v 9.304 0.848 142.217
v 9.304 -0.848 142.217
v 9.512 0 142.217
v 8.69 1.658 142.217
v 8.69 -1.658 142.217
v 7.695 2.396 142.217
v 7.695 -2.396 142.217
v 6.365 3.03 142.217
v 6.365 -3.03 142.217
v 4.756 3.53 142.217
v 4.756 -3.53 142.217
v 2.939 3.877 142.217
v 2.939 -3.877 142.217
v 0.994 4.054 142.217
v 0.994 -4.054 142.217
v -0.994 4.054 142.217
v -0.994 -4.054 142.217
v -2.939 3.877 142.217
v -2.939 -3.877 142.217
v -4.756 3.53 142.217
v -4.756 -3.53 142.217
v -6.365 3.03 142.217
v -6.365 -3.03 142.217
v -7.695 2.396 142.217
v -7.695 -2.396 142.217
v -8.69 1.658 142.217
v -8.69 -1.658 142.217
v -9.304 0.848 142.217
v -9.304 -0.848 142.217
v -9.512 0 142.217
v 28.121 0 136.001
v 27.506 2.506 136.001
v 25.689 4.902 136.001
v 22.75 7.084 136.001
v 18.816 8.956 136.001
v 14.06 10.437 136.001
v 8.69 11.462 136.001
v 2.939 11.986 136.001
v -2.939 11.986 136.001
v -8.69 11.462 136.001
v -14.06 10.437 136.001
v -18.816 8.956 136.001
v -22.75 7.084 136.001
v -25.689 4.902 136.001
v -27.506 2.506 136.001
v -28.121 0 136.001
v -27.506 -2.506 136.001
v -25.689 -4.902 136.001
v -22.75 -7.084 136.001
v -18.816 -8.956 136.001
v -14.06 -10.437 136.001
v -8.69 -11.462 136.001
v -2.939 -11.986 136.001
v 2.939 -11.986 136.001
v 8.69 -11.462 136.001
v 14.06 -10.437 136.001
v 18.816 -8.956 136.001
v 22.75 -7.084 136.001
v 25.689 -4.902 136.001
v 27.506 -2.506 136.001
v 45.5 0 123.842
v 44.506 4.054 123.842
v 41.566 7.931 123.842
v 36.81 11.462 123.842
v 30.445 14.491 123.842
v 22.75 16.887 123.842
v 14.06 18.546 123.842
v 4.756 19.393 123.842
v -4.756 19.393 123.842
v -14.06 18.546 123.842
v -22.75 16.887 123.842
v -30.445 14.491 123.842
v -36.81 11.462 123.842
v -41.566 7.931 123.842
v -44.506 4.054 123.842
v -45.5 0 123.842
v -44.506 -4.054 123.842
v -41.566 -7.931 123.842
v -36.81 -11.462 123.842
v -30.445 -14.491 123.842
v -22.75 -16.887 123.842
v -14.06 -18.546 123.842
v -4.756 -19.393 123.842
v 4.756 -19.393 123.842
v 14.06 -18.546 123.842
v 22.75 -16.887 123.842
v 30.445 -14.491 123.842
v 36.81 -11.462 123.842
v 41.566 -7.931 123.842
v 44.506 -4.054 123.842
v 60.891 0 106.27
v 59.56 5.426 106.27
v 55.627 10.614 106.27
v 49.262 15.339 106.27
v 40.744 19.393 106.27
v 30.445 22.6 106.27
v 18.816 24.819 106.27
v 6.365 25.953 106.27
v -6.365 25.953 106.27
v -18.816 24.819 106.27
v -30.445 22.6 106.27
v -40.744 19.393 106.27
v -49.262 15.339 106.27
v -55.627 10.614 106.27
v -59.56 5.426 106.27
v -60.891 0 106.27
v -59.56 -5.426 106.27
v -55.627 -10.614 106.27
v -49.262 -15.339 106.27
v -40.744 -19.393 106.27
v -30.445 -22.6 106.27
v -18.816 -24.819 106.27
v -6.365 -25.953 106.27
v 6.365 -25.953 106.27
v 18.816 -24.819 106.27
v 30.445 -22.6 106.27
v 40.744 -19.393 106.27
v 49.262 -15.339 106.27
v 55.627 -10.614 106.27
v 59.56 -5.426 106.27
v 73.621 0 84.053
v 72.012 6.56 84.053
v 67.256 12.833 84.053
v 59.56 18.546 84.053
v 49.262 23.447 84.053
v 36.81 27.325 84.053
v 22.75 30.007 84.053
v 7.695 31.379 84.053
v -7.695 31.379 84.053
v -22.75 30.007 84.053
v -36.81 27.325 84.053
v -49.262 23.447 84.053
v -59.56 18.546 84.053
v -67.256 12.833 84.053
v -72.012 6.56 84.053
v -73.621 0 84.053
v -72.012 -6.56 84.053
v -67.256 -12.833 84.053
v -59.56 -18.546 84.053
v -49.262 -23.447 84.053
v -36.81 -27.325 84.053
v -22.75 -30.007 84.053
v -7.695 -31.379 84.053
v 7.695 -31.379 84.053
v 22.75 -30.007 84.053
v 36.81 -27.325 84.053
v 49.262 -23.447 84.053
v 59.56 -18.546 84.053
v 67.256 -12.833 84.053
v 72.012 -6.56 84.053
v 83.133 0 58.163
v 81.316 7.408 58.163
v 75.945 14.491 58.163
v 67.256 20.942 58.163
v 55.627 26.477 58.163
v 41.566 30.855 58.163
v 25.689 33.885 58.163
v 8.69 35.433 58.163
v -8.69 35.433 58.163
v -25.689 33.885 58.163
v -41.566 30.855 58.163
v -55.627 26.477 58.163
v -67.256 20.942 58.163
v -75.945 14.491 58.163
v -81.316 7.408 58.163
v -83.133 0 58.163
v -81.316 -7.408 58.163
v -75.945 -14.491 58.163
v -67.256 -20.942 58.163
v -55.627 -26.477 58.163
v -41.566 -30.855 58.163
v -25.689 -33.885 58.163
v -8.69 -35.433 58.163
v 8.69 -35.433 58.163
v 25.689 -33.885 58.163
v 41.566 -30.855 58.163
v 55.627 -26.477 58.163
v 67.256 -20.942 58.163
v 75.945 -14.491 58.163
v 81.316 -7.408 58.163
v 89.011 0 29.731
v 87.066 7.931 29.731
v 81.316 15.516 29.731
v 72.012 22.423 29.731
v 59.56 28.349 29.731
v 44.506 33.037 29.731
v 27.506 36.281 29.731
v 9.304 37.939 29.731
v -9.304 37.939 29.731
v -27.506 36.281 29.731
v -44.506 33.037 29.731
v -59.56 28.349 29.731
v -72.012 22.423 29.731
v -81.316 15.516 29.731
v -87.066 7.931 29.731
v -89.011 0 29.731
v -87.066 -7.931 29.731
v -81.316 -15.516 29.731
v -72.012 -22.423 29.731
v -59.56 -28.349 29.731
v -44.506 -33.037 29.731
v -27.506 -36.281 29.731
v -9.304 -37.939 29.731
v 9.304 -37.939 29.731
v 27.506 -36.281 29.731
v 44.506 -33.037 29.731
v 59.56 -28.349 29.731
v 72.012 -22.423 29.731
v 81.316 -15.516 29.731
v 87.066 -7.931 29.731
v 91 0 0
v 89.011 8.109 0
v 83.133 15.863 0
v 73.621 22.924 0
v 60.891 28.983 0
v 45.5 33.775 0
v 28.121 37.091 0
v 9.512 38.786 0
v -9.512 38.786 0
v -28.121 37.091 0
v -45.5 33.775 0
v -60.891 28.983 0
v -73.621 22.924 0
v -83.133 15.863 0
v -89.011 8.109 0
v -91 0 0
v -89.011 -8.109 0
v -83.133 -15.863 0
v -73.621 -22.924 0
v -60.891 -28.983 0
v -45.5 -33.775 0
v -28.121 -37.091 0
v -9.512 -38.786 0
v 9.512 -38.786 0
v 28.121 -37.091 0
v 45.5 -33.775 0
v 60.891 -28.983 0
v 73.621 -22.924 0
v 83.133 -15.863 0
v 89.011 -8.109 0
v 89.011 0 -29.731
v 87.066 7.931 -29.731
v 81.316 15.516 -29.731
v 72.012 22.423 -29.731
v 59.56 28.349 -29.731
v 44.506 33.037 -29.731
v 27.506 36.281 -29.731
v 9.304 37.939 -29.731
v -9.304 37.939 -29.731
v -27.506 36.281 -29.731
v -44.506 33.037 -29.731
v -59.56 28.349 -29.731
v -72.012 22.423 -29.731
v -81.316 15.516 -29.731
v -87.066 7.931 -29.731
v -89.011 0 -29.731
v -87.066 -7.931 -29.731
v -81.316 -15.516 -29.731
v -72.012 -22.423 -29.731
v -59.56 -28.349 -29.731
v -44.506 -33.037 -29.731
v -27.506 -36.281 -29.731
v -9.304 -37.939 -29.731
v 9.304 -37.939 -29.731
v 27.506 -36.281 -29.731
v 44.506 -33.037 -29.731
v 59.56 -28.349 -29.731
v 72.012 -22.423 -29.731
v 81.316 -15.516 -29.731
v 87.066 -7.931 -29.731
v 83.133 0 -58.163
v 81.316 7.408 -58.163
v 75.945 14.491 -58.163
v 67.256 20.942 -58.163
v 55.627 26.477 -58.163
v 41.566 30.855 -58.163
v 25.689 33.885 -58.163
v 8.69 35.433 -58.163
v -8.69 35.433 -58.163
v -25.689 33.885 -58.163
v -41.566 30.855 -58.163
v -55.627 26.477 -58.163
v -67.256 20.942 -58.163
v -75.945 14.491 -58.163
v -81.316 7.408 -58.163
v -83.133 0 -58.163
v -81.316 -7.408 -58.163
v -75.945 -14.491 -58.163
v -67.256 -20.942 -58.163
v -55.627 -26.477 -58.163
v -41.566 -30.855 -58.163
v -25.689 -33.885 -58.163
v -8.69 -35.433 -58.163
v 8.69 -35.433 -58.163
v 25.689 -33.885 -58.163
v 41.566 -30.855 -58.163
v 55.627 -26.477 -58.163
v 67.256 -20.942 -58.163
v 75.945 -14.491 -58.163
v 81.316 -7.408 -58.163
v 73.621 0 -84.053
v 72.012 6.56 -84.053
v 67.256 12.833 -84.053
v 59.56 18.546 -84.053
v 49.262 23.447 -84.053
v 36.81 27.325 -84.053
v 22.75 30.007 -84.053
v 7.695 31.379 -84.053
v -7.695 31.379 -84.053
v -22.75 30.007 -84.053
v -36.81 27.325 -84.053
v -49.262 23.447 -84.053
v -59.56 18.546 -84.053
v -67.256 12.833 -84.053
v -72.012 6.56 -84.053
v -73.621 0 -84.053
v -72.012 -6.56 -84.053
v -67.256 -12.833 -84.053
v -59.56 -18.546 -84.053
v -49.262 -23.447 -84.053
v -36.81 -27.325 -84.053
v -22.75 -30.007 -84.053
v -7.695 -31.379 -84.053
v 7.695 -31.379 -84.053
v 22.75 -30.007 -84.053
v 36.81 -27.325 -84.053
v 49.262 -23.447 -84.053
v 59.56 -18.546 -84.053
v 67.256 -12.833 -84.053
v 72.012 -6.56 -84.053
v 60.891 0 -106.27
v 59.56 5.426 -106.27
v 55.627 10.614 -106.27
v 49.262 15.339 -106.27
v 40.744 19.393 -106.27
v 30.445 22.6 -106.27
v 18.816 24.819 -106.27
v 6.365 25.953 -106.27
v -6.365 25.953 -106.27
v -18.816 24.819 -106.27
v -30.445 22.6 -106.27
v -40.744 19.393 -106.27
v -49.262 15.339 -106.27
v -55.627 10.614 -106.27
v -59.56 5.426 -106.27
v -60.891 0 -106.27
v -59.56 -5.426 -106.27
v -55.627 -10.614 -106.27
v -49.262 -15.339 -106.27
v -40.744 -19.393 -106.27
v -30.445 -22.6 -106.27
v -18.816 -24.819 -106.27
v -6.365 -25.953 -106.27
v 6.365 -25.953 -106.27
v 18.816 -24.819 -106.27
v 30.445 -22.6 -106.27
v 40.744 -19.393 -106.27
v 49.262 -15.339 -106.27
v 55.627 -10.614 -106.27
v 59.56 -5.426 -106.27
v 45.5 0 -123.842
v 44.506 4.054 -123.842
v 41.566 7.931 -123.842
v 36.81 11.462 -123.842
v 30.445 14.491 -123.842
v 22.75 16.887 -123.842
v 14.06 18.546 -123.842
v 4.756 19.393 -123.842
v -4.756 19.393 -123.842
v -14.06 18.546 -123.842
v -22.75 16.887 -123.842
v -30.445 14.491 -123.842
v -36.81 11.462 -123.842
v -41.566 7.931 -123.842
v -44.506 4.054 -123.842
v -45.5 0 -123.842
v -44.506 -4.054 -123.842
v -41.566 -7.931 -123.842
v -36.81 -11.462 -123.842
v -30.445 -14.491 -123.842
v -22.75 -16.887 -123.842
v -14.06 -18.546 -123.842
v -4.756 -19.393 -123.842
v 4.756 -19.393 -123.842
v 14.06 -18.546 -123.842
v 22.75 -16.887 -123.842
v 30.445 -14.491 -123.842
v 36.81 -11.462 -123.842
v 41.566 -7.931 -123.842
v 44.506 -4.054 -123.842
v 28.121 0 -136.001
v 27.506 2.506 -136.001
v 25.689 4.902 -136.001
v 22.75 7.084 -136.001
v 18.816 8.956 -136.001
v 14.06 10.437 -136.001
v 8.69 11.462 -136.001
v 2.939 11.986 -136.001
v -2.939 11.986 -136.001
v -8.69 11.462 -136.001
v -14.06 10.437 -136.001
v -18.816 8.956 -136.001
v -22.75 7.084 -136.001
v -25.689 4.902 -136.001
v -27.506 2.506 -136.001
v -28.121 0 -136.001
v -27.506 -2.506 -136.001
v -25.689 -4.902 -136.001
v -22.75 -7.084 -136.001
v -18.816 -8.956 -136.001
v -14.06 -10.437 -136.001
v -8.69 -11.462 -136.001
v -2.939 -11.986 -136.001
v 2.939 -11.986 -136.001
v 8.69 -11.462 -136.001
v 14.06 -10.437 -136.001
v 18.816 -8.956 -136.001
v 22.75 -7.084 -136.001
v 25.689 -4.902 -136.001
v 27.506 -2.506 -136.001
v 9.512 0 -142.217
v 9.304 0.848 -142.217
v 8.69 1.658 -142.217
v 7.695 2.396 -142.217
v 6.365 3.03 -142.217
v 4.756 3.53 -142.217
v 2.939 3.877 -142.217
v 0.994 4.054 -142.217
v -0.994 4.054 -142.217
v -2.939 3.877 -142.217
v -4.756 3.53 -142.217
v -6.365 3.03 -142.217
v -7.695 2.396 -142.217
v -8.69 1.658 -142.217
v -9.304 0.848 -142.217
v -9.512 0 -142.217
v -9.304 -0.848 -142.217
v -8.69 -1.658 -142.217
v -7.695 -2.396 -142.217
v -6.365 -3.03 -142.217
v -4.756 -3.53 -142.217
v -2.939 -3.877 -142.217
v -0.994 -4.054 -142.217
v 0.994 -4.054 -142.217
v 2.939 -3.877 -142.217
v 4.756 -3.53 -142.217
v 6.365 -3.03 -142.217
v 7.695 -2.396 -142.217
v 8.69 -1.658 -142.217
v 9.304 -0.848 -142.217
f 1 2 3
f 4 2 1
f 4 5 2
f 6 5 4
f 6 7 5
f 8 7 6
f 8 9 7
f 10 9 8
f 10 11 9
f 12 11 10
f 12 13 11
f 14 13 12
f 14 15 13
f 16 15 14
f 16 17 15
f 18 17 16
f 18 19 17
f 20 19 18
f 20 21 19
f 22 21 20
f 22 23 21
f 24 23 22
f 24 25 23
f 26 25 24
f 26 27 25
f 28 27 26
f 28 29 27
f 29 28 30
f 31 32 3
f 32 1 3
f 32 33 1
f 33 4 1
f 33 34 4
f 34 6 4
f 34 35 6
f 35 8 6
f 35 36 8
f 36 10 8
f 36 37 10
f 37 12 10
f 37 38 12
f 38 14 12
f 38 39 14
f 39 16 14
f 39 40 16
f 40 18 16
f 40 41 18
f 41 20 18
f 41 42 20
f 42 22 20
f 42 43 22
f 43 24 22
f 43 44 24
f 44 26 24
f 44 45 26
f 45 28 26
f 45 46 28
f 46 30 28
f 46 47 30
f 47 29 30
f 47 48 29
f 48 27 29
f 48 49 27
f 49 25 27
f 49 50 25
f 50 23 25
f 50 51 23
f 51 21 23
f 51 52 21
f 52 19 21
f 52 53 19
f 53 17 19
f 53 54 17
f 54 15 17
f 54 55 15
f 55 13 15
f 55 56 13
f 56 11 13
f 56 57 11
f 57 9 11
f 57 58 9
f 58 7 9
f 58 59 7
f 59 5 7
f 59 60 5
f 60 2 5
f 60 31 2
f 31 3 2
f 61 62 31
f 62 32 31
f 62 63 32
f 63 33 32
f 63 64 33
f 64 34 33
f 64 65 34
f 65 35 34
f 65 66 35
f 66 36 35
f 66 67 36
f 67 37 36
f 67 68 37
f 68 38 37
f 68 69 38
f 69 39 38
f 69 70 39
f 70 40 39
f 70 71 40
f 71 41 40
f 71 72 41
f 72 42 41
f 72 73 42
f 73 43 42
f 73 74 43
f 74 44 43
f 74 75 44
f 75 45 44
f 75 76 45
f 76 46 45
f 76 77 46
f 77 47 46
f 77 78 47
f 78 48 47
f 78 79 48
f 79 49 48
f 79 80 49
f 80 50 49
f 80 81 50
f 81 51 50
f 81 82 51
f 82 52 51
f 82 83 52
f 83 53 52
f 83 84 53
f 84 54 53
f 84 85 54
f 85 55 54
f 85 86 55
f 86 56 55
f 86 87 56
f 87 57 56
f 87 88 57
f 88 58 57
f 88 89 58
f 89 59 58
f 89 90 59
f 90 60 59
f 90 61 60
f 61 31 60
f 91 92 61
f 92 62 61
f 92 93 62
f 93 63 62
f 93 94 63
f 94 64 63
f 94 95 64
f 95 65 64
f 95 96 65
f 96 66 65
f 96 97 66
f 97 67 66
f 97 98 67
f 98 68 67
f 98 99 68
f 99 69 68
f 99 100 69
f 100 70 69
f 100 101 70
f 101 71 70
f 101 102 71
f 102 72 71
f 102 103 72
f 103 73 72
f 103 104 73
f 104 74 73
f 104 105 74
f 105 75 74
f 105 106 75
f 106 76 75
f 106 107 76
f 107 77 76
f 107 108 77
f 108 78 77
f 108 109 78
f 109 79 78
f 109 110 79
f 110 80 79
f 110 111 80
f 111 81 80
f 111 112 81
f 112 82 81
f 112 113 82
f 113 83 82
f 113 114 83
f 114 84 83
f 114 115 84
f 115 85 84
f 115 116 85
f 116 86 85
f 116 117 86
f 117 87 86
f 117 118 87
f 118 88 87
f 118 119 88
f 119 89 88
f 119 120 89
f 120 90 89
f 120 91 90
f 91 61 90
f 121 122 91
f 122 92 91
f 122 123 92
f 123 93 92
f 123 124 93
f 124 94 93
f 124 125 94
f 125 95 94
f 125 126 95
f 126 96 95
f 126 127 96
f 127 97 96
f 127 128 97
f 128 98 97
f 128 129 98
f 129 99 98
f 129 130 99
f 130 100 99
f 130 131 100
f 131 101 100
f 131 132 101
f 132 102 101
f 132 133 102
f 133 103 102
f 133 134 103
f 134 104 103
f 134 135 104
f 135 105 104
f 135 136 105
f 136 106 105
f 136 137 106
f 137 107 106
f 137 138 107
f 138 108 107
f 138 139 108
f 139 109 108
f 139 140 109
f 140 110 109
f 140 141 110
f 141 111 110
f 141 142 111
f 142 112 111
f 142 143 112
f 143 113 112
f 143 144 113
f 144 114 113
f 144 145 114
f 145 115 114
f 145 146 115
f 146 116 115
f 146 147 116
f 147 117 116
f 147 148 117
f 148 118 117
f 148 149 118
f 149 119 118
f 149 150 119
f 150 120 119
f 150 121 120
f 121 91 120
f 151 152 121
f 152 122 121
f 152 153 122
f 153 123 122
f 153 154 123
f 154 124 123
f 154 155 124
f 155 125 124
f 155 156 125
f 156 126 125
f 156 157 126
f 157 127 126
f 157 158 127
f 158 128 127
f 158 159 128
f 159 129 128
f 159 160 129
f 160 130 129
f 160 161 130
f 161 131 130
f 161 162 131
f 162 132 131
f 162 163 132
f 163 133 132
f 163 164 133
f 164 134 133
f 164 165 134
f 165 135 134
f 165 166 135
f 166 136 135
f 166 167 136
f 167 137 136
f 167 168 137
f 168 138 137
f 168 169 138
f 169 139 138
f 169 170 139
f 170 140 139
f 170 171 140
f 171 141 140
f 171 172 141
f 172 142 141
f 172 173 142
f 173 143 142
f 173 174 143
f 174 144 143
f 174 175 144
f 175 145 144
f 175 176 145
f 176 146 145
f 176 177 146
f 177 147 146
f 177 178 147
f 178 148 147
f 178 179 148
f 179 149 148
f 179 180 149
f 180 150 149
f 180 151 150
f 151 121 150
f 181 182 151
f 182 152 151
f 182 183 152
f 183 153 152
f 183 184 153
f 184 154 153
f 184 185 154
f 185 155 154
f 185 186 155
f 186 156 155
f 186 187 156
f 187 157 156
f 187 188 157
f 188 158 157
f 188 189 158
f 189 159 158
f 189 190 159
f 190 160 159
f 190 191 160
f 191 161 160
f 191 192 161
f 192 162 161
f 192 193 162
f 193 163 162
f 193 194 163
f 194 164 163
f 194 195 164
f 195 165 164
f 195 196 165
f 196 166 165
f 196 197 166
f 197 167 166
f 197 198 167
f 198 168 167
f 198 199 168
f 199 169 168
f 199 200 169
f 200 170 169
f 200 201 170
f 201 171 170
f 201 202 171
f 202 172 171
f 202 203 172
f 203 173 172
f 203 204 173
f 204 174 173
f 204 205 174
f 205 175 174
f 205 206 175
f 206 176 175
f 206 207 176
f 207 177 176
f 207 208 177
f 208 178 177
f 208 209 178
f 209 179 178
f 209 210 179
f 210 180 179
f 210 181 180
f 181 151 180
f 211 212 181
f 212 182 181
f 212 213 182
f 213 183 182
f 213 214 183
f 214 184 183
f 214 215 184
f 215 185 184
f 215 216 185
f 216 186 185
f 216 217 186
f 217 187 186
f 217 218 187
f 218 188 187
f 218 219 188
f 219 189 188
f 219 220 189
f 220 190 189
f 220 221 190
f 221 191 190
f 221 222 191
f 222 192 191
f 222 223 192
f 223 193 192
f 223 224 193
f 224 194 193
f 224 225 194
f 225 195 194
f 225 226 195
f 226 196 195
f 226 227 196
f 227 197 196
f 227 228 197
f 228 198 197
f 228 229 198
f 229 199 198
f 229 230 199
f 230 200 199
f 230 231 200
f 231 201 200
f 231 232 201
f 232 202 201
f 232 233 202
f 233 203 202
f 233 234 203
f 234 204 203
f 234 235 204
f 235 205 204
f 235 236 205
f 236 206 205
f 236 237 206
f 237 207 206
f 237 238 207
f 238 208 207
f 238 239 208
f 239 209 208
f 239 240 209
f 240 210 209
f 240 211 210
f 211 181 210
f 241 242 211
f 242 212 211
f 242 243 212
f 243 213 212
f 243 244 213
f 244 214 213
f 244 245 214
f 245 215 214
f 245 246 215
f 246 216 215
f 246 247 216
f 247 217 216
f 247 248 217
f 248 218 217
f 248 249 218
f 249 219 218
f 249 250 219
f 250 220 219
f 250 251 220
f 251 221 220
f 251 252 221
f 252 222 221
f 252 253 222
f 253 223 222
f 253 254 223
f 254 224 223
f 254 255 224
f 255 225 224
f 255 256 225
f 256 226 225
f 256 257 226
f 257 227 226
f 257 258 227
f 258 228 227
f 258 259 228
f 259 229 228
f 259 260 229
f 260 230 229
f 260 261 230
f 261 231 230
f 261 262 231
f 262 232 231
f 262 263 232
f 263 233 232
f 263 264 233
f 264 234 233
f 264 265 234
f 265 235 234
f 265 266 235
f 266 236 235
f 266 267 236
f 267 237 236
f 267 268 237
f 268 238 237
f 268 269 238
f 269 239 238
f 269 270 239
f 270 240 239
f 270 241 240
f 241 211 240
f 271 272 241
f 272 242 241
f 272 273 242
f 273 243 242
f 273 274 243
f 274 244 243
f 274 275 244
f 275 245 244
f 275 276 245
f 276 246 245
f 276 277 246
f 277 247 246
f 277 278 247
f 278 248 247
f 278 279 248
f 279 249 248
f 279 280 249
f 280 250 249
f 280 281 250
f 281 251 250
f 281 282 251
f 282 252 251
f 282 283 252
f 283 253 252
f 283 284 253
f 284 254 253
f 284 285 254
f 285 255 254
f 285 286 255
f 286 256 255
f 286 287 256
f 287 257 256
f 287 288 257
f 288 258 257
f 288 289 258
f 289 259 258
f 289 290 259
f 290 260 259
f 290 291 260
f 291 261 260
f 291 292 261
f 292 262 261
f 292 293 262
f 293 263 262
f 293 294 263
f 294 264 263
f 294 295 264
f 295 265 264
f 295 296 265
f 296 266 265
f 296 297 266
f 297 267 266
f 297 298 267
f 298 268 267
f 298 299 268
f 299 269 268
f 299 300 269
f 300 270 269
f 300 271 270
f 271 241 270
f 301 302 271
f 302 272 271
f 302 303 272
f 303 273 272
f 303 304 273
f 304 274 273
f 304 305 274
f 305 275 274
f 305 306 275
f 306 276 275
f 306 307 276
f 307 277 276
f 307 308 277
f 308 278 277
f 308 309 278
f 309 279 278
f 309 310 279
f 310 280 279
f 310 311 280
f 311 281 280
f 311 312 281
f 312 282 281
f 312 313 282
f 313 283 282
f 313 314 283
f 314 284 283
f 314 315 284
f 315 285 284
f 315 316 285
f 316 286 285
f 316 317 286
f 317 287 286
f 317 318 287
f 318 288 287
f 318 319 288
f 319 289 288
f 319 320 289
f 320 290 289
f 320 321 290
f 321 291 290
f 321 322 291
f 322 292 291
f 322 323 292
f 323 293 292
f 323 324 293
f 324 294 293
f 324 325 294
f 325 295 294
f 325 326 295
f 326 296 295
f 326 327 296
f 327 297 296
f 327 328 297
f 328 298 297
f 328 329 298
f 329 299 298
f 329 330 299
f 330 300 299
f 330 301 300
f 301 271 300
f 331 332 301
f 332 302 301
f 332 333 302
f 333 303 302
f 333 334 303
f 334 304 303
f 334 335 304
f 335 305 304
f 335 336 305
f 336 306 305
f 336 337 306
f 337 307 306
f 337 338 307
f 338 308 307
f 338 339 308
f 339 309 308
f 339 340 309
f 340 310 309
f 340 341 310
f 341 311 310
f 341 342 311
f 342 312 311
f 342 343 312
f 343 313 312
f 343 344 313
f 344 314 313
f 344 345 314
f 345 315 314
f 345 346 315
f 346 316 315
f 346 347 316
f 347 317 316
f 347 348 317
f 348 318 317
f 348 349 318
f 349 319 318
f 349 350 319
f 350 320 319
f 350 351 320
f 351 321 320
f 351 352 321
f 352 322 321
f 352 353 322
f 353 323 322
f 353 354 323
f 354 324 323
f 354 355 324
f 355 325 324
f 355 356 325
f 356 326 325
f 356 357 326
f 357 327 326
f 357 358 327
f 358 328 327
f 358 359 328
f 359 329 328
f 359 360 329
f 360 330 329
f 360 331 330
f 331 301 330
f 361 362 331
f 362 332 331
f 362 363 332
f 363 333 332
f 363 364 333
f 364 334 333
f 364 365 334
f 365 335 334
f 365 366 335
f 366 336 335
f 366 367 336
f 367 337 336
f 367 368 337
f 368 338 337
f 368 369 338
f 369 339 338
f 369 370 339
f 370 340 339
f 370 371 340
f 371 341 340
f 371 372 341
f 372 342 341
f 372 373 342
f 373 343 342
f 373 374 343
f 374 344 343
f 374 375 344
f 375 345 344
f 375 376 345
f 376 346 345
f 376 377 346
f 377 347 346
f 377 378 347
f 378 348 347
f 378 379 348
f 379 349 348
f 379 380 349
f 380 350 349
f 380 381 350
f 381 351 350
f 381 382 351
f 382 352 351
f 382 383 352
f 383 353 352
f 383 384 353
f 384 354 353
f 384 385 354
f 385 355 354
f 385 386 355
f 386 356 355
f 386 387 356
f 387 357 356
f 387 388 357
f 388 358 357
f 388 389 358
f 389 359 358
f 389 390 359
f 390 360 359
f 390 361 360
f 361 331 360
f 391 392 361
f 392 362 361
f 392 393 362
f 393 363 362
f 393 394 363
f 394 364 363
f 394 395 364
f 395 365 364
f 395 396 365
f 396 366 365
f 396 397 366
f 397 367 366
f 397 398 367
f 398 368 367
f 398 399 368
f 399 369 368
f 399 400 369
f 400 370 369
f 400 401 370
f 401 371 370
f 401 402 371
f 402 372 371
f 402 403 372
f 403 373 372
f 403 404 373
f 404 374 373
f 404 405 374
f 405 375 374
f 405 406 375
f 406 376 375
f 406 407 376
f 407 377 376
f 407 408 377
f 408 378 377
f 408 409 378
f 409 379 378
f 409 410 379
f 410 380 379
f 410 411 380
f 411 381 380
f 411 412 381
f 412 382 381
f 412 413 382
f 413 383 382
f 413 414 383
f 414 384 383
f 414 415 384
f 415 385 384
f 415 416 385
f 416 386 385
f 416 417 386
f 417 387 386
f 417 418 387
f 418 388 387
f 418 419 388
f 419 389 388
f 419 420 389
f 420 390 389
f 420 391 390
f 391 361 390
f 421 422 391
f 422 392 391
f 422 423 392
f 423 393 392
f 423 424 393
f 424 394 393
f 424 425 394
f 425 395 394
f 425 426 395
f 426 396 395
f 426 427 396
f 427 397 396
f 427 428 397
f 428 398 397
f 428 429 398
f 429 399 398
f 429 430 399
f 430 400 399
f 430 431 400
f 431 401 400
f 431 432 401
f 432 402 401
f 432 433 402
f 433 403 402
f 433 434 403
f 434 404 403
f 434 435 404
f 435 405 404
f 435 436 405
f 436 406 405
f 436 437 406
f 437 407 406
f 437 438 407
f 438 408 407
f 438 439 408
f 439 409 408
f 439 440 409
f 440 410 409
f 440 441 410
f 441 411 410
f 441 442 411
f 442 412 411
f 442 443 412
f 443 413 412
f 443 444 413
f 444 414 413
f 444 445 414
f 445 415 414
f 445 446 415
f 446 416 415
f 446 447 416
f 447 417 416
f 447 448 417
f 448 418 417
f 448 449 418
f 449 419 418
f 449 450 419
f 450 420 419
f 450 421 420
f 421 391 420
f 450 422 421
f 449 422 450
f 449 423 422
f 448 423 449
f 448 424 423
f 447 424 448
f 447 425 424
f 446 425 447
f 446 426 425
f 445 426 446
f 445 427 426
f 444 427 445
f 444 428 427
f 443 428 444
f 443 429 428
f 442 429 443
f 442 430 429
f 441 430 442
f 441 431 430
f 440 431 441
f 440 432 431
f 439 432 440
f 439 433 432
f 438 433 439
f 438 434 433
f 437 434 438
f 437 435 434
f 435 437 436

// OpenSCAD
// Generated by SolidPython 1.0.1 on 2020-07-29 00:46:47


scale(v = [7, 3, 11]) {
	sphere(r = 13);
}
/***********************************************
*********      SolidPython code:      **********
************************************************
 
# import packages: SolidPython
from solid import *
from solid.utils import *
from itertools import chain, combinations, permutations


class Resize:

    def __init__(self, scad_file):
        self.scad_file = scad_file
        #self.scad_file = import_scad(scad_file)
        # cone/cylinder param:
        self.r1 = 0
        self.r2 = 0
        self.h = 0
        # rectangular prism param:
        self.w = 0
        self.l = 0
        # ellipse param:
        self.r = 0

    # import OpenScad code (file name corresponds to shape)


    # classify shape + parameters
    def assign(self, param1, param2, param3):
        if self.scad_file == 'cone.scad':
            self.r1 = param1
            self.r2 = param2
            self.h = param3
        elif self.scad_file == 'cylinder.scad':
            self.r1 = param1
            self.r2 = param2
            self.h = param3
        elif self.scad_file == 'rectangularPrism.scad':
            self.h = param1
            self.l = param2
            self.w = param3
        else:
            self.r = param1
            self.h = param2

    # resize parameters
    def iterate(self):
        x = range(3, 20, 2)
        i = 1
        if self.scad_file == 'cone.scad':
            tempList = list(permutations(x, 2))
            for temp in tempList:
                param1 = temp[0]
                param2 = temp[1]
                filepath = 'produced_scad_files/' + 'cone' + str(param1) + '_' + str(param2) + '_' + '.scad'
                scad_render_to_file(cylinder(h=param1, r1=param2, r2=0), filepath)

        elif self.scad_file == 'cylinder.scad':
            tempList = list(permutations(x, 3))
            for temp in tempList:
                param1 = temp[0]
                param2 = temp[1]
                filepath = 'produced_scad_files/' + 'cylinder' + str(param1) + '_' + str(param2) + '_' + '.scad'
                scad_render_to_file(cylinder(h=param1, r1=param2, r2=param2), filepath)

        elif self.scad_file == 'rectangularPrism.scad':
            tempList = list(permutations(x, 3))
            for temp in tempList:
                param1 = temp[0]
                param2 = temp[1]
                param3 = temp[2]
                filepath = 'produced_scad_files/' + 'rectangularPrism' + str(param1) + '_' + str(param2) + '_' + str(
                    param3) + '.scad'
                scad_render_to_file(cube(size=(param1, param2, param3)), filepath)

        elif self.scad_file == 'ellipse.scad':
            tempList = list(permutations(x, 4))
            for temp in tempList:
                param1 = temp[0]
                param2 = temp[1]
                param3 = temp[2]
                param4 = temp[3]
                filepath = 'produced_scad_files/' + 'ellipse' + str(param1) + '_' + str(param2) + '_' + str(param3) + '_' + str(param4) + '.scad'
                scad_render_to_file(scale([param1, param2, param3])(sphere(r=param4)), filepath)

    def render_to_scadfile(self):
        scad_render_to_file(scad, 'example.scad') 
 
************************************************/
